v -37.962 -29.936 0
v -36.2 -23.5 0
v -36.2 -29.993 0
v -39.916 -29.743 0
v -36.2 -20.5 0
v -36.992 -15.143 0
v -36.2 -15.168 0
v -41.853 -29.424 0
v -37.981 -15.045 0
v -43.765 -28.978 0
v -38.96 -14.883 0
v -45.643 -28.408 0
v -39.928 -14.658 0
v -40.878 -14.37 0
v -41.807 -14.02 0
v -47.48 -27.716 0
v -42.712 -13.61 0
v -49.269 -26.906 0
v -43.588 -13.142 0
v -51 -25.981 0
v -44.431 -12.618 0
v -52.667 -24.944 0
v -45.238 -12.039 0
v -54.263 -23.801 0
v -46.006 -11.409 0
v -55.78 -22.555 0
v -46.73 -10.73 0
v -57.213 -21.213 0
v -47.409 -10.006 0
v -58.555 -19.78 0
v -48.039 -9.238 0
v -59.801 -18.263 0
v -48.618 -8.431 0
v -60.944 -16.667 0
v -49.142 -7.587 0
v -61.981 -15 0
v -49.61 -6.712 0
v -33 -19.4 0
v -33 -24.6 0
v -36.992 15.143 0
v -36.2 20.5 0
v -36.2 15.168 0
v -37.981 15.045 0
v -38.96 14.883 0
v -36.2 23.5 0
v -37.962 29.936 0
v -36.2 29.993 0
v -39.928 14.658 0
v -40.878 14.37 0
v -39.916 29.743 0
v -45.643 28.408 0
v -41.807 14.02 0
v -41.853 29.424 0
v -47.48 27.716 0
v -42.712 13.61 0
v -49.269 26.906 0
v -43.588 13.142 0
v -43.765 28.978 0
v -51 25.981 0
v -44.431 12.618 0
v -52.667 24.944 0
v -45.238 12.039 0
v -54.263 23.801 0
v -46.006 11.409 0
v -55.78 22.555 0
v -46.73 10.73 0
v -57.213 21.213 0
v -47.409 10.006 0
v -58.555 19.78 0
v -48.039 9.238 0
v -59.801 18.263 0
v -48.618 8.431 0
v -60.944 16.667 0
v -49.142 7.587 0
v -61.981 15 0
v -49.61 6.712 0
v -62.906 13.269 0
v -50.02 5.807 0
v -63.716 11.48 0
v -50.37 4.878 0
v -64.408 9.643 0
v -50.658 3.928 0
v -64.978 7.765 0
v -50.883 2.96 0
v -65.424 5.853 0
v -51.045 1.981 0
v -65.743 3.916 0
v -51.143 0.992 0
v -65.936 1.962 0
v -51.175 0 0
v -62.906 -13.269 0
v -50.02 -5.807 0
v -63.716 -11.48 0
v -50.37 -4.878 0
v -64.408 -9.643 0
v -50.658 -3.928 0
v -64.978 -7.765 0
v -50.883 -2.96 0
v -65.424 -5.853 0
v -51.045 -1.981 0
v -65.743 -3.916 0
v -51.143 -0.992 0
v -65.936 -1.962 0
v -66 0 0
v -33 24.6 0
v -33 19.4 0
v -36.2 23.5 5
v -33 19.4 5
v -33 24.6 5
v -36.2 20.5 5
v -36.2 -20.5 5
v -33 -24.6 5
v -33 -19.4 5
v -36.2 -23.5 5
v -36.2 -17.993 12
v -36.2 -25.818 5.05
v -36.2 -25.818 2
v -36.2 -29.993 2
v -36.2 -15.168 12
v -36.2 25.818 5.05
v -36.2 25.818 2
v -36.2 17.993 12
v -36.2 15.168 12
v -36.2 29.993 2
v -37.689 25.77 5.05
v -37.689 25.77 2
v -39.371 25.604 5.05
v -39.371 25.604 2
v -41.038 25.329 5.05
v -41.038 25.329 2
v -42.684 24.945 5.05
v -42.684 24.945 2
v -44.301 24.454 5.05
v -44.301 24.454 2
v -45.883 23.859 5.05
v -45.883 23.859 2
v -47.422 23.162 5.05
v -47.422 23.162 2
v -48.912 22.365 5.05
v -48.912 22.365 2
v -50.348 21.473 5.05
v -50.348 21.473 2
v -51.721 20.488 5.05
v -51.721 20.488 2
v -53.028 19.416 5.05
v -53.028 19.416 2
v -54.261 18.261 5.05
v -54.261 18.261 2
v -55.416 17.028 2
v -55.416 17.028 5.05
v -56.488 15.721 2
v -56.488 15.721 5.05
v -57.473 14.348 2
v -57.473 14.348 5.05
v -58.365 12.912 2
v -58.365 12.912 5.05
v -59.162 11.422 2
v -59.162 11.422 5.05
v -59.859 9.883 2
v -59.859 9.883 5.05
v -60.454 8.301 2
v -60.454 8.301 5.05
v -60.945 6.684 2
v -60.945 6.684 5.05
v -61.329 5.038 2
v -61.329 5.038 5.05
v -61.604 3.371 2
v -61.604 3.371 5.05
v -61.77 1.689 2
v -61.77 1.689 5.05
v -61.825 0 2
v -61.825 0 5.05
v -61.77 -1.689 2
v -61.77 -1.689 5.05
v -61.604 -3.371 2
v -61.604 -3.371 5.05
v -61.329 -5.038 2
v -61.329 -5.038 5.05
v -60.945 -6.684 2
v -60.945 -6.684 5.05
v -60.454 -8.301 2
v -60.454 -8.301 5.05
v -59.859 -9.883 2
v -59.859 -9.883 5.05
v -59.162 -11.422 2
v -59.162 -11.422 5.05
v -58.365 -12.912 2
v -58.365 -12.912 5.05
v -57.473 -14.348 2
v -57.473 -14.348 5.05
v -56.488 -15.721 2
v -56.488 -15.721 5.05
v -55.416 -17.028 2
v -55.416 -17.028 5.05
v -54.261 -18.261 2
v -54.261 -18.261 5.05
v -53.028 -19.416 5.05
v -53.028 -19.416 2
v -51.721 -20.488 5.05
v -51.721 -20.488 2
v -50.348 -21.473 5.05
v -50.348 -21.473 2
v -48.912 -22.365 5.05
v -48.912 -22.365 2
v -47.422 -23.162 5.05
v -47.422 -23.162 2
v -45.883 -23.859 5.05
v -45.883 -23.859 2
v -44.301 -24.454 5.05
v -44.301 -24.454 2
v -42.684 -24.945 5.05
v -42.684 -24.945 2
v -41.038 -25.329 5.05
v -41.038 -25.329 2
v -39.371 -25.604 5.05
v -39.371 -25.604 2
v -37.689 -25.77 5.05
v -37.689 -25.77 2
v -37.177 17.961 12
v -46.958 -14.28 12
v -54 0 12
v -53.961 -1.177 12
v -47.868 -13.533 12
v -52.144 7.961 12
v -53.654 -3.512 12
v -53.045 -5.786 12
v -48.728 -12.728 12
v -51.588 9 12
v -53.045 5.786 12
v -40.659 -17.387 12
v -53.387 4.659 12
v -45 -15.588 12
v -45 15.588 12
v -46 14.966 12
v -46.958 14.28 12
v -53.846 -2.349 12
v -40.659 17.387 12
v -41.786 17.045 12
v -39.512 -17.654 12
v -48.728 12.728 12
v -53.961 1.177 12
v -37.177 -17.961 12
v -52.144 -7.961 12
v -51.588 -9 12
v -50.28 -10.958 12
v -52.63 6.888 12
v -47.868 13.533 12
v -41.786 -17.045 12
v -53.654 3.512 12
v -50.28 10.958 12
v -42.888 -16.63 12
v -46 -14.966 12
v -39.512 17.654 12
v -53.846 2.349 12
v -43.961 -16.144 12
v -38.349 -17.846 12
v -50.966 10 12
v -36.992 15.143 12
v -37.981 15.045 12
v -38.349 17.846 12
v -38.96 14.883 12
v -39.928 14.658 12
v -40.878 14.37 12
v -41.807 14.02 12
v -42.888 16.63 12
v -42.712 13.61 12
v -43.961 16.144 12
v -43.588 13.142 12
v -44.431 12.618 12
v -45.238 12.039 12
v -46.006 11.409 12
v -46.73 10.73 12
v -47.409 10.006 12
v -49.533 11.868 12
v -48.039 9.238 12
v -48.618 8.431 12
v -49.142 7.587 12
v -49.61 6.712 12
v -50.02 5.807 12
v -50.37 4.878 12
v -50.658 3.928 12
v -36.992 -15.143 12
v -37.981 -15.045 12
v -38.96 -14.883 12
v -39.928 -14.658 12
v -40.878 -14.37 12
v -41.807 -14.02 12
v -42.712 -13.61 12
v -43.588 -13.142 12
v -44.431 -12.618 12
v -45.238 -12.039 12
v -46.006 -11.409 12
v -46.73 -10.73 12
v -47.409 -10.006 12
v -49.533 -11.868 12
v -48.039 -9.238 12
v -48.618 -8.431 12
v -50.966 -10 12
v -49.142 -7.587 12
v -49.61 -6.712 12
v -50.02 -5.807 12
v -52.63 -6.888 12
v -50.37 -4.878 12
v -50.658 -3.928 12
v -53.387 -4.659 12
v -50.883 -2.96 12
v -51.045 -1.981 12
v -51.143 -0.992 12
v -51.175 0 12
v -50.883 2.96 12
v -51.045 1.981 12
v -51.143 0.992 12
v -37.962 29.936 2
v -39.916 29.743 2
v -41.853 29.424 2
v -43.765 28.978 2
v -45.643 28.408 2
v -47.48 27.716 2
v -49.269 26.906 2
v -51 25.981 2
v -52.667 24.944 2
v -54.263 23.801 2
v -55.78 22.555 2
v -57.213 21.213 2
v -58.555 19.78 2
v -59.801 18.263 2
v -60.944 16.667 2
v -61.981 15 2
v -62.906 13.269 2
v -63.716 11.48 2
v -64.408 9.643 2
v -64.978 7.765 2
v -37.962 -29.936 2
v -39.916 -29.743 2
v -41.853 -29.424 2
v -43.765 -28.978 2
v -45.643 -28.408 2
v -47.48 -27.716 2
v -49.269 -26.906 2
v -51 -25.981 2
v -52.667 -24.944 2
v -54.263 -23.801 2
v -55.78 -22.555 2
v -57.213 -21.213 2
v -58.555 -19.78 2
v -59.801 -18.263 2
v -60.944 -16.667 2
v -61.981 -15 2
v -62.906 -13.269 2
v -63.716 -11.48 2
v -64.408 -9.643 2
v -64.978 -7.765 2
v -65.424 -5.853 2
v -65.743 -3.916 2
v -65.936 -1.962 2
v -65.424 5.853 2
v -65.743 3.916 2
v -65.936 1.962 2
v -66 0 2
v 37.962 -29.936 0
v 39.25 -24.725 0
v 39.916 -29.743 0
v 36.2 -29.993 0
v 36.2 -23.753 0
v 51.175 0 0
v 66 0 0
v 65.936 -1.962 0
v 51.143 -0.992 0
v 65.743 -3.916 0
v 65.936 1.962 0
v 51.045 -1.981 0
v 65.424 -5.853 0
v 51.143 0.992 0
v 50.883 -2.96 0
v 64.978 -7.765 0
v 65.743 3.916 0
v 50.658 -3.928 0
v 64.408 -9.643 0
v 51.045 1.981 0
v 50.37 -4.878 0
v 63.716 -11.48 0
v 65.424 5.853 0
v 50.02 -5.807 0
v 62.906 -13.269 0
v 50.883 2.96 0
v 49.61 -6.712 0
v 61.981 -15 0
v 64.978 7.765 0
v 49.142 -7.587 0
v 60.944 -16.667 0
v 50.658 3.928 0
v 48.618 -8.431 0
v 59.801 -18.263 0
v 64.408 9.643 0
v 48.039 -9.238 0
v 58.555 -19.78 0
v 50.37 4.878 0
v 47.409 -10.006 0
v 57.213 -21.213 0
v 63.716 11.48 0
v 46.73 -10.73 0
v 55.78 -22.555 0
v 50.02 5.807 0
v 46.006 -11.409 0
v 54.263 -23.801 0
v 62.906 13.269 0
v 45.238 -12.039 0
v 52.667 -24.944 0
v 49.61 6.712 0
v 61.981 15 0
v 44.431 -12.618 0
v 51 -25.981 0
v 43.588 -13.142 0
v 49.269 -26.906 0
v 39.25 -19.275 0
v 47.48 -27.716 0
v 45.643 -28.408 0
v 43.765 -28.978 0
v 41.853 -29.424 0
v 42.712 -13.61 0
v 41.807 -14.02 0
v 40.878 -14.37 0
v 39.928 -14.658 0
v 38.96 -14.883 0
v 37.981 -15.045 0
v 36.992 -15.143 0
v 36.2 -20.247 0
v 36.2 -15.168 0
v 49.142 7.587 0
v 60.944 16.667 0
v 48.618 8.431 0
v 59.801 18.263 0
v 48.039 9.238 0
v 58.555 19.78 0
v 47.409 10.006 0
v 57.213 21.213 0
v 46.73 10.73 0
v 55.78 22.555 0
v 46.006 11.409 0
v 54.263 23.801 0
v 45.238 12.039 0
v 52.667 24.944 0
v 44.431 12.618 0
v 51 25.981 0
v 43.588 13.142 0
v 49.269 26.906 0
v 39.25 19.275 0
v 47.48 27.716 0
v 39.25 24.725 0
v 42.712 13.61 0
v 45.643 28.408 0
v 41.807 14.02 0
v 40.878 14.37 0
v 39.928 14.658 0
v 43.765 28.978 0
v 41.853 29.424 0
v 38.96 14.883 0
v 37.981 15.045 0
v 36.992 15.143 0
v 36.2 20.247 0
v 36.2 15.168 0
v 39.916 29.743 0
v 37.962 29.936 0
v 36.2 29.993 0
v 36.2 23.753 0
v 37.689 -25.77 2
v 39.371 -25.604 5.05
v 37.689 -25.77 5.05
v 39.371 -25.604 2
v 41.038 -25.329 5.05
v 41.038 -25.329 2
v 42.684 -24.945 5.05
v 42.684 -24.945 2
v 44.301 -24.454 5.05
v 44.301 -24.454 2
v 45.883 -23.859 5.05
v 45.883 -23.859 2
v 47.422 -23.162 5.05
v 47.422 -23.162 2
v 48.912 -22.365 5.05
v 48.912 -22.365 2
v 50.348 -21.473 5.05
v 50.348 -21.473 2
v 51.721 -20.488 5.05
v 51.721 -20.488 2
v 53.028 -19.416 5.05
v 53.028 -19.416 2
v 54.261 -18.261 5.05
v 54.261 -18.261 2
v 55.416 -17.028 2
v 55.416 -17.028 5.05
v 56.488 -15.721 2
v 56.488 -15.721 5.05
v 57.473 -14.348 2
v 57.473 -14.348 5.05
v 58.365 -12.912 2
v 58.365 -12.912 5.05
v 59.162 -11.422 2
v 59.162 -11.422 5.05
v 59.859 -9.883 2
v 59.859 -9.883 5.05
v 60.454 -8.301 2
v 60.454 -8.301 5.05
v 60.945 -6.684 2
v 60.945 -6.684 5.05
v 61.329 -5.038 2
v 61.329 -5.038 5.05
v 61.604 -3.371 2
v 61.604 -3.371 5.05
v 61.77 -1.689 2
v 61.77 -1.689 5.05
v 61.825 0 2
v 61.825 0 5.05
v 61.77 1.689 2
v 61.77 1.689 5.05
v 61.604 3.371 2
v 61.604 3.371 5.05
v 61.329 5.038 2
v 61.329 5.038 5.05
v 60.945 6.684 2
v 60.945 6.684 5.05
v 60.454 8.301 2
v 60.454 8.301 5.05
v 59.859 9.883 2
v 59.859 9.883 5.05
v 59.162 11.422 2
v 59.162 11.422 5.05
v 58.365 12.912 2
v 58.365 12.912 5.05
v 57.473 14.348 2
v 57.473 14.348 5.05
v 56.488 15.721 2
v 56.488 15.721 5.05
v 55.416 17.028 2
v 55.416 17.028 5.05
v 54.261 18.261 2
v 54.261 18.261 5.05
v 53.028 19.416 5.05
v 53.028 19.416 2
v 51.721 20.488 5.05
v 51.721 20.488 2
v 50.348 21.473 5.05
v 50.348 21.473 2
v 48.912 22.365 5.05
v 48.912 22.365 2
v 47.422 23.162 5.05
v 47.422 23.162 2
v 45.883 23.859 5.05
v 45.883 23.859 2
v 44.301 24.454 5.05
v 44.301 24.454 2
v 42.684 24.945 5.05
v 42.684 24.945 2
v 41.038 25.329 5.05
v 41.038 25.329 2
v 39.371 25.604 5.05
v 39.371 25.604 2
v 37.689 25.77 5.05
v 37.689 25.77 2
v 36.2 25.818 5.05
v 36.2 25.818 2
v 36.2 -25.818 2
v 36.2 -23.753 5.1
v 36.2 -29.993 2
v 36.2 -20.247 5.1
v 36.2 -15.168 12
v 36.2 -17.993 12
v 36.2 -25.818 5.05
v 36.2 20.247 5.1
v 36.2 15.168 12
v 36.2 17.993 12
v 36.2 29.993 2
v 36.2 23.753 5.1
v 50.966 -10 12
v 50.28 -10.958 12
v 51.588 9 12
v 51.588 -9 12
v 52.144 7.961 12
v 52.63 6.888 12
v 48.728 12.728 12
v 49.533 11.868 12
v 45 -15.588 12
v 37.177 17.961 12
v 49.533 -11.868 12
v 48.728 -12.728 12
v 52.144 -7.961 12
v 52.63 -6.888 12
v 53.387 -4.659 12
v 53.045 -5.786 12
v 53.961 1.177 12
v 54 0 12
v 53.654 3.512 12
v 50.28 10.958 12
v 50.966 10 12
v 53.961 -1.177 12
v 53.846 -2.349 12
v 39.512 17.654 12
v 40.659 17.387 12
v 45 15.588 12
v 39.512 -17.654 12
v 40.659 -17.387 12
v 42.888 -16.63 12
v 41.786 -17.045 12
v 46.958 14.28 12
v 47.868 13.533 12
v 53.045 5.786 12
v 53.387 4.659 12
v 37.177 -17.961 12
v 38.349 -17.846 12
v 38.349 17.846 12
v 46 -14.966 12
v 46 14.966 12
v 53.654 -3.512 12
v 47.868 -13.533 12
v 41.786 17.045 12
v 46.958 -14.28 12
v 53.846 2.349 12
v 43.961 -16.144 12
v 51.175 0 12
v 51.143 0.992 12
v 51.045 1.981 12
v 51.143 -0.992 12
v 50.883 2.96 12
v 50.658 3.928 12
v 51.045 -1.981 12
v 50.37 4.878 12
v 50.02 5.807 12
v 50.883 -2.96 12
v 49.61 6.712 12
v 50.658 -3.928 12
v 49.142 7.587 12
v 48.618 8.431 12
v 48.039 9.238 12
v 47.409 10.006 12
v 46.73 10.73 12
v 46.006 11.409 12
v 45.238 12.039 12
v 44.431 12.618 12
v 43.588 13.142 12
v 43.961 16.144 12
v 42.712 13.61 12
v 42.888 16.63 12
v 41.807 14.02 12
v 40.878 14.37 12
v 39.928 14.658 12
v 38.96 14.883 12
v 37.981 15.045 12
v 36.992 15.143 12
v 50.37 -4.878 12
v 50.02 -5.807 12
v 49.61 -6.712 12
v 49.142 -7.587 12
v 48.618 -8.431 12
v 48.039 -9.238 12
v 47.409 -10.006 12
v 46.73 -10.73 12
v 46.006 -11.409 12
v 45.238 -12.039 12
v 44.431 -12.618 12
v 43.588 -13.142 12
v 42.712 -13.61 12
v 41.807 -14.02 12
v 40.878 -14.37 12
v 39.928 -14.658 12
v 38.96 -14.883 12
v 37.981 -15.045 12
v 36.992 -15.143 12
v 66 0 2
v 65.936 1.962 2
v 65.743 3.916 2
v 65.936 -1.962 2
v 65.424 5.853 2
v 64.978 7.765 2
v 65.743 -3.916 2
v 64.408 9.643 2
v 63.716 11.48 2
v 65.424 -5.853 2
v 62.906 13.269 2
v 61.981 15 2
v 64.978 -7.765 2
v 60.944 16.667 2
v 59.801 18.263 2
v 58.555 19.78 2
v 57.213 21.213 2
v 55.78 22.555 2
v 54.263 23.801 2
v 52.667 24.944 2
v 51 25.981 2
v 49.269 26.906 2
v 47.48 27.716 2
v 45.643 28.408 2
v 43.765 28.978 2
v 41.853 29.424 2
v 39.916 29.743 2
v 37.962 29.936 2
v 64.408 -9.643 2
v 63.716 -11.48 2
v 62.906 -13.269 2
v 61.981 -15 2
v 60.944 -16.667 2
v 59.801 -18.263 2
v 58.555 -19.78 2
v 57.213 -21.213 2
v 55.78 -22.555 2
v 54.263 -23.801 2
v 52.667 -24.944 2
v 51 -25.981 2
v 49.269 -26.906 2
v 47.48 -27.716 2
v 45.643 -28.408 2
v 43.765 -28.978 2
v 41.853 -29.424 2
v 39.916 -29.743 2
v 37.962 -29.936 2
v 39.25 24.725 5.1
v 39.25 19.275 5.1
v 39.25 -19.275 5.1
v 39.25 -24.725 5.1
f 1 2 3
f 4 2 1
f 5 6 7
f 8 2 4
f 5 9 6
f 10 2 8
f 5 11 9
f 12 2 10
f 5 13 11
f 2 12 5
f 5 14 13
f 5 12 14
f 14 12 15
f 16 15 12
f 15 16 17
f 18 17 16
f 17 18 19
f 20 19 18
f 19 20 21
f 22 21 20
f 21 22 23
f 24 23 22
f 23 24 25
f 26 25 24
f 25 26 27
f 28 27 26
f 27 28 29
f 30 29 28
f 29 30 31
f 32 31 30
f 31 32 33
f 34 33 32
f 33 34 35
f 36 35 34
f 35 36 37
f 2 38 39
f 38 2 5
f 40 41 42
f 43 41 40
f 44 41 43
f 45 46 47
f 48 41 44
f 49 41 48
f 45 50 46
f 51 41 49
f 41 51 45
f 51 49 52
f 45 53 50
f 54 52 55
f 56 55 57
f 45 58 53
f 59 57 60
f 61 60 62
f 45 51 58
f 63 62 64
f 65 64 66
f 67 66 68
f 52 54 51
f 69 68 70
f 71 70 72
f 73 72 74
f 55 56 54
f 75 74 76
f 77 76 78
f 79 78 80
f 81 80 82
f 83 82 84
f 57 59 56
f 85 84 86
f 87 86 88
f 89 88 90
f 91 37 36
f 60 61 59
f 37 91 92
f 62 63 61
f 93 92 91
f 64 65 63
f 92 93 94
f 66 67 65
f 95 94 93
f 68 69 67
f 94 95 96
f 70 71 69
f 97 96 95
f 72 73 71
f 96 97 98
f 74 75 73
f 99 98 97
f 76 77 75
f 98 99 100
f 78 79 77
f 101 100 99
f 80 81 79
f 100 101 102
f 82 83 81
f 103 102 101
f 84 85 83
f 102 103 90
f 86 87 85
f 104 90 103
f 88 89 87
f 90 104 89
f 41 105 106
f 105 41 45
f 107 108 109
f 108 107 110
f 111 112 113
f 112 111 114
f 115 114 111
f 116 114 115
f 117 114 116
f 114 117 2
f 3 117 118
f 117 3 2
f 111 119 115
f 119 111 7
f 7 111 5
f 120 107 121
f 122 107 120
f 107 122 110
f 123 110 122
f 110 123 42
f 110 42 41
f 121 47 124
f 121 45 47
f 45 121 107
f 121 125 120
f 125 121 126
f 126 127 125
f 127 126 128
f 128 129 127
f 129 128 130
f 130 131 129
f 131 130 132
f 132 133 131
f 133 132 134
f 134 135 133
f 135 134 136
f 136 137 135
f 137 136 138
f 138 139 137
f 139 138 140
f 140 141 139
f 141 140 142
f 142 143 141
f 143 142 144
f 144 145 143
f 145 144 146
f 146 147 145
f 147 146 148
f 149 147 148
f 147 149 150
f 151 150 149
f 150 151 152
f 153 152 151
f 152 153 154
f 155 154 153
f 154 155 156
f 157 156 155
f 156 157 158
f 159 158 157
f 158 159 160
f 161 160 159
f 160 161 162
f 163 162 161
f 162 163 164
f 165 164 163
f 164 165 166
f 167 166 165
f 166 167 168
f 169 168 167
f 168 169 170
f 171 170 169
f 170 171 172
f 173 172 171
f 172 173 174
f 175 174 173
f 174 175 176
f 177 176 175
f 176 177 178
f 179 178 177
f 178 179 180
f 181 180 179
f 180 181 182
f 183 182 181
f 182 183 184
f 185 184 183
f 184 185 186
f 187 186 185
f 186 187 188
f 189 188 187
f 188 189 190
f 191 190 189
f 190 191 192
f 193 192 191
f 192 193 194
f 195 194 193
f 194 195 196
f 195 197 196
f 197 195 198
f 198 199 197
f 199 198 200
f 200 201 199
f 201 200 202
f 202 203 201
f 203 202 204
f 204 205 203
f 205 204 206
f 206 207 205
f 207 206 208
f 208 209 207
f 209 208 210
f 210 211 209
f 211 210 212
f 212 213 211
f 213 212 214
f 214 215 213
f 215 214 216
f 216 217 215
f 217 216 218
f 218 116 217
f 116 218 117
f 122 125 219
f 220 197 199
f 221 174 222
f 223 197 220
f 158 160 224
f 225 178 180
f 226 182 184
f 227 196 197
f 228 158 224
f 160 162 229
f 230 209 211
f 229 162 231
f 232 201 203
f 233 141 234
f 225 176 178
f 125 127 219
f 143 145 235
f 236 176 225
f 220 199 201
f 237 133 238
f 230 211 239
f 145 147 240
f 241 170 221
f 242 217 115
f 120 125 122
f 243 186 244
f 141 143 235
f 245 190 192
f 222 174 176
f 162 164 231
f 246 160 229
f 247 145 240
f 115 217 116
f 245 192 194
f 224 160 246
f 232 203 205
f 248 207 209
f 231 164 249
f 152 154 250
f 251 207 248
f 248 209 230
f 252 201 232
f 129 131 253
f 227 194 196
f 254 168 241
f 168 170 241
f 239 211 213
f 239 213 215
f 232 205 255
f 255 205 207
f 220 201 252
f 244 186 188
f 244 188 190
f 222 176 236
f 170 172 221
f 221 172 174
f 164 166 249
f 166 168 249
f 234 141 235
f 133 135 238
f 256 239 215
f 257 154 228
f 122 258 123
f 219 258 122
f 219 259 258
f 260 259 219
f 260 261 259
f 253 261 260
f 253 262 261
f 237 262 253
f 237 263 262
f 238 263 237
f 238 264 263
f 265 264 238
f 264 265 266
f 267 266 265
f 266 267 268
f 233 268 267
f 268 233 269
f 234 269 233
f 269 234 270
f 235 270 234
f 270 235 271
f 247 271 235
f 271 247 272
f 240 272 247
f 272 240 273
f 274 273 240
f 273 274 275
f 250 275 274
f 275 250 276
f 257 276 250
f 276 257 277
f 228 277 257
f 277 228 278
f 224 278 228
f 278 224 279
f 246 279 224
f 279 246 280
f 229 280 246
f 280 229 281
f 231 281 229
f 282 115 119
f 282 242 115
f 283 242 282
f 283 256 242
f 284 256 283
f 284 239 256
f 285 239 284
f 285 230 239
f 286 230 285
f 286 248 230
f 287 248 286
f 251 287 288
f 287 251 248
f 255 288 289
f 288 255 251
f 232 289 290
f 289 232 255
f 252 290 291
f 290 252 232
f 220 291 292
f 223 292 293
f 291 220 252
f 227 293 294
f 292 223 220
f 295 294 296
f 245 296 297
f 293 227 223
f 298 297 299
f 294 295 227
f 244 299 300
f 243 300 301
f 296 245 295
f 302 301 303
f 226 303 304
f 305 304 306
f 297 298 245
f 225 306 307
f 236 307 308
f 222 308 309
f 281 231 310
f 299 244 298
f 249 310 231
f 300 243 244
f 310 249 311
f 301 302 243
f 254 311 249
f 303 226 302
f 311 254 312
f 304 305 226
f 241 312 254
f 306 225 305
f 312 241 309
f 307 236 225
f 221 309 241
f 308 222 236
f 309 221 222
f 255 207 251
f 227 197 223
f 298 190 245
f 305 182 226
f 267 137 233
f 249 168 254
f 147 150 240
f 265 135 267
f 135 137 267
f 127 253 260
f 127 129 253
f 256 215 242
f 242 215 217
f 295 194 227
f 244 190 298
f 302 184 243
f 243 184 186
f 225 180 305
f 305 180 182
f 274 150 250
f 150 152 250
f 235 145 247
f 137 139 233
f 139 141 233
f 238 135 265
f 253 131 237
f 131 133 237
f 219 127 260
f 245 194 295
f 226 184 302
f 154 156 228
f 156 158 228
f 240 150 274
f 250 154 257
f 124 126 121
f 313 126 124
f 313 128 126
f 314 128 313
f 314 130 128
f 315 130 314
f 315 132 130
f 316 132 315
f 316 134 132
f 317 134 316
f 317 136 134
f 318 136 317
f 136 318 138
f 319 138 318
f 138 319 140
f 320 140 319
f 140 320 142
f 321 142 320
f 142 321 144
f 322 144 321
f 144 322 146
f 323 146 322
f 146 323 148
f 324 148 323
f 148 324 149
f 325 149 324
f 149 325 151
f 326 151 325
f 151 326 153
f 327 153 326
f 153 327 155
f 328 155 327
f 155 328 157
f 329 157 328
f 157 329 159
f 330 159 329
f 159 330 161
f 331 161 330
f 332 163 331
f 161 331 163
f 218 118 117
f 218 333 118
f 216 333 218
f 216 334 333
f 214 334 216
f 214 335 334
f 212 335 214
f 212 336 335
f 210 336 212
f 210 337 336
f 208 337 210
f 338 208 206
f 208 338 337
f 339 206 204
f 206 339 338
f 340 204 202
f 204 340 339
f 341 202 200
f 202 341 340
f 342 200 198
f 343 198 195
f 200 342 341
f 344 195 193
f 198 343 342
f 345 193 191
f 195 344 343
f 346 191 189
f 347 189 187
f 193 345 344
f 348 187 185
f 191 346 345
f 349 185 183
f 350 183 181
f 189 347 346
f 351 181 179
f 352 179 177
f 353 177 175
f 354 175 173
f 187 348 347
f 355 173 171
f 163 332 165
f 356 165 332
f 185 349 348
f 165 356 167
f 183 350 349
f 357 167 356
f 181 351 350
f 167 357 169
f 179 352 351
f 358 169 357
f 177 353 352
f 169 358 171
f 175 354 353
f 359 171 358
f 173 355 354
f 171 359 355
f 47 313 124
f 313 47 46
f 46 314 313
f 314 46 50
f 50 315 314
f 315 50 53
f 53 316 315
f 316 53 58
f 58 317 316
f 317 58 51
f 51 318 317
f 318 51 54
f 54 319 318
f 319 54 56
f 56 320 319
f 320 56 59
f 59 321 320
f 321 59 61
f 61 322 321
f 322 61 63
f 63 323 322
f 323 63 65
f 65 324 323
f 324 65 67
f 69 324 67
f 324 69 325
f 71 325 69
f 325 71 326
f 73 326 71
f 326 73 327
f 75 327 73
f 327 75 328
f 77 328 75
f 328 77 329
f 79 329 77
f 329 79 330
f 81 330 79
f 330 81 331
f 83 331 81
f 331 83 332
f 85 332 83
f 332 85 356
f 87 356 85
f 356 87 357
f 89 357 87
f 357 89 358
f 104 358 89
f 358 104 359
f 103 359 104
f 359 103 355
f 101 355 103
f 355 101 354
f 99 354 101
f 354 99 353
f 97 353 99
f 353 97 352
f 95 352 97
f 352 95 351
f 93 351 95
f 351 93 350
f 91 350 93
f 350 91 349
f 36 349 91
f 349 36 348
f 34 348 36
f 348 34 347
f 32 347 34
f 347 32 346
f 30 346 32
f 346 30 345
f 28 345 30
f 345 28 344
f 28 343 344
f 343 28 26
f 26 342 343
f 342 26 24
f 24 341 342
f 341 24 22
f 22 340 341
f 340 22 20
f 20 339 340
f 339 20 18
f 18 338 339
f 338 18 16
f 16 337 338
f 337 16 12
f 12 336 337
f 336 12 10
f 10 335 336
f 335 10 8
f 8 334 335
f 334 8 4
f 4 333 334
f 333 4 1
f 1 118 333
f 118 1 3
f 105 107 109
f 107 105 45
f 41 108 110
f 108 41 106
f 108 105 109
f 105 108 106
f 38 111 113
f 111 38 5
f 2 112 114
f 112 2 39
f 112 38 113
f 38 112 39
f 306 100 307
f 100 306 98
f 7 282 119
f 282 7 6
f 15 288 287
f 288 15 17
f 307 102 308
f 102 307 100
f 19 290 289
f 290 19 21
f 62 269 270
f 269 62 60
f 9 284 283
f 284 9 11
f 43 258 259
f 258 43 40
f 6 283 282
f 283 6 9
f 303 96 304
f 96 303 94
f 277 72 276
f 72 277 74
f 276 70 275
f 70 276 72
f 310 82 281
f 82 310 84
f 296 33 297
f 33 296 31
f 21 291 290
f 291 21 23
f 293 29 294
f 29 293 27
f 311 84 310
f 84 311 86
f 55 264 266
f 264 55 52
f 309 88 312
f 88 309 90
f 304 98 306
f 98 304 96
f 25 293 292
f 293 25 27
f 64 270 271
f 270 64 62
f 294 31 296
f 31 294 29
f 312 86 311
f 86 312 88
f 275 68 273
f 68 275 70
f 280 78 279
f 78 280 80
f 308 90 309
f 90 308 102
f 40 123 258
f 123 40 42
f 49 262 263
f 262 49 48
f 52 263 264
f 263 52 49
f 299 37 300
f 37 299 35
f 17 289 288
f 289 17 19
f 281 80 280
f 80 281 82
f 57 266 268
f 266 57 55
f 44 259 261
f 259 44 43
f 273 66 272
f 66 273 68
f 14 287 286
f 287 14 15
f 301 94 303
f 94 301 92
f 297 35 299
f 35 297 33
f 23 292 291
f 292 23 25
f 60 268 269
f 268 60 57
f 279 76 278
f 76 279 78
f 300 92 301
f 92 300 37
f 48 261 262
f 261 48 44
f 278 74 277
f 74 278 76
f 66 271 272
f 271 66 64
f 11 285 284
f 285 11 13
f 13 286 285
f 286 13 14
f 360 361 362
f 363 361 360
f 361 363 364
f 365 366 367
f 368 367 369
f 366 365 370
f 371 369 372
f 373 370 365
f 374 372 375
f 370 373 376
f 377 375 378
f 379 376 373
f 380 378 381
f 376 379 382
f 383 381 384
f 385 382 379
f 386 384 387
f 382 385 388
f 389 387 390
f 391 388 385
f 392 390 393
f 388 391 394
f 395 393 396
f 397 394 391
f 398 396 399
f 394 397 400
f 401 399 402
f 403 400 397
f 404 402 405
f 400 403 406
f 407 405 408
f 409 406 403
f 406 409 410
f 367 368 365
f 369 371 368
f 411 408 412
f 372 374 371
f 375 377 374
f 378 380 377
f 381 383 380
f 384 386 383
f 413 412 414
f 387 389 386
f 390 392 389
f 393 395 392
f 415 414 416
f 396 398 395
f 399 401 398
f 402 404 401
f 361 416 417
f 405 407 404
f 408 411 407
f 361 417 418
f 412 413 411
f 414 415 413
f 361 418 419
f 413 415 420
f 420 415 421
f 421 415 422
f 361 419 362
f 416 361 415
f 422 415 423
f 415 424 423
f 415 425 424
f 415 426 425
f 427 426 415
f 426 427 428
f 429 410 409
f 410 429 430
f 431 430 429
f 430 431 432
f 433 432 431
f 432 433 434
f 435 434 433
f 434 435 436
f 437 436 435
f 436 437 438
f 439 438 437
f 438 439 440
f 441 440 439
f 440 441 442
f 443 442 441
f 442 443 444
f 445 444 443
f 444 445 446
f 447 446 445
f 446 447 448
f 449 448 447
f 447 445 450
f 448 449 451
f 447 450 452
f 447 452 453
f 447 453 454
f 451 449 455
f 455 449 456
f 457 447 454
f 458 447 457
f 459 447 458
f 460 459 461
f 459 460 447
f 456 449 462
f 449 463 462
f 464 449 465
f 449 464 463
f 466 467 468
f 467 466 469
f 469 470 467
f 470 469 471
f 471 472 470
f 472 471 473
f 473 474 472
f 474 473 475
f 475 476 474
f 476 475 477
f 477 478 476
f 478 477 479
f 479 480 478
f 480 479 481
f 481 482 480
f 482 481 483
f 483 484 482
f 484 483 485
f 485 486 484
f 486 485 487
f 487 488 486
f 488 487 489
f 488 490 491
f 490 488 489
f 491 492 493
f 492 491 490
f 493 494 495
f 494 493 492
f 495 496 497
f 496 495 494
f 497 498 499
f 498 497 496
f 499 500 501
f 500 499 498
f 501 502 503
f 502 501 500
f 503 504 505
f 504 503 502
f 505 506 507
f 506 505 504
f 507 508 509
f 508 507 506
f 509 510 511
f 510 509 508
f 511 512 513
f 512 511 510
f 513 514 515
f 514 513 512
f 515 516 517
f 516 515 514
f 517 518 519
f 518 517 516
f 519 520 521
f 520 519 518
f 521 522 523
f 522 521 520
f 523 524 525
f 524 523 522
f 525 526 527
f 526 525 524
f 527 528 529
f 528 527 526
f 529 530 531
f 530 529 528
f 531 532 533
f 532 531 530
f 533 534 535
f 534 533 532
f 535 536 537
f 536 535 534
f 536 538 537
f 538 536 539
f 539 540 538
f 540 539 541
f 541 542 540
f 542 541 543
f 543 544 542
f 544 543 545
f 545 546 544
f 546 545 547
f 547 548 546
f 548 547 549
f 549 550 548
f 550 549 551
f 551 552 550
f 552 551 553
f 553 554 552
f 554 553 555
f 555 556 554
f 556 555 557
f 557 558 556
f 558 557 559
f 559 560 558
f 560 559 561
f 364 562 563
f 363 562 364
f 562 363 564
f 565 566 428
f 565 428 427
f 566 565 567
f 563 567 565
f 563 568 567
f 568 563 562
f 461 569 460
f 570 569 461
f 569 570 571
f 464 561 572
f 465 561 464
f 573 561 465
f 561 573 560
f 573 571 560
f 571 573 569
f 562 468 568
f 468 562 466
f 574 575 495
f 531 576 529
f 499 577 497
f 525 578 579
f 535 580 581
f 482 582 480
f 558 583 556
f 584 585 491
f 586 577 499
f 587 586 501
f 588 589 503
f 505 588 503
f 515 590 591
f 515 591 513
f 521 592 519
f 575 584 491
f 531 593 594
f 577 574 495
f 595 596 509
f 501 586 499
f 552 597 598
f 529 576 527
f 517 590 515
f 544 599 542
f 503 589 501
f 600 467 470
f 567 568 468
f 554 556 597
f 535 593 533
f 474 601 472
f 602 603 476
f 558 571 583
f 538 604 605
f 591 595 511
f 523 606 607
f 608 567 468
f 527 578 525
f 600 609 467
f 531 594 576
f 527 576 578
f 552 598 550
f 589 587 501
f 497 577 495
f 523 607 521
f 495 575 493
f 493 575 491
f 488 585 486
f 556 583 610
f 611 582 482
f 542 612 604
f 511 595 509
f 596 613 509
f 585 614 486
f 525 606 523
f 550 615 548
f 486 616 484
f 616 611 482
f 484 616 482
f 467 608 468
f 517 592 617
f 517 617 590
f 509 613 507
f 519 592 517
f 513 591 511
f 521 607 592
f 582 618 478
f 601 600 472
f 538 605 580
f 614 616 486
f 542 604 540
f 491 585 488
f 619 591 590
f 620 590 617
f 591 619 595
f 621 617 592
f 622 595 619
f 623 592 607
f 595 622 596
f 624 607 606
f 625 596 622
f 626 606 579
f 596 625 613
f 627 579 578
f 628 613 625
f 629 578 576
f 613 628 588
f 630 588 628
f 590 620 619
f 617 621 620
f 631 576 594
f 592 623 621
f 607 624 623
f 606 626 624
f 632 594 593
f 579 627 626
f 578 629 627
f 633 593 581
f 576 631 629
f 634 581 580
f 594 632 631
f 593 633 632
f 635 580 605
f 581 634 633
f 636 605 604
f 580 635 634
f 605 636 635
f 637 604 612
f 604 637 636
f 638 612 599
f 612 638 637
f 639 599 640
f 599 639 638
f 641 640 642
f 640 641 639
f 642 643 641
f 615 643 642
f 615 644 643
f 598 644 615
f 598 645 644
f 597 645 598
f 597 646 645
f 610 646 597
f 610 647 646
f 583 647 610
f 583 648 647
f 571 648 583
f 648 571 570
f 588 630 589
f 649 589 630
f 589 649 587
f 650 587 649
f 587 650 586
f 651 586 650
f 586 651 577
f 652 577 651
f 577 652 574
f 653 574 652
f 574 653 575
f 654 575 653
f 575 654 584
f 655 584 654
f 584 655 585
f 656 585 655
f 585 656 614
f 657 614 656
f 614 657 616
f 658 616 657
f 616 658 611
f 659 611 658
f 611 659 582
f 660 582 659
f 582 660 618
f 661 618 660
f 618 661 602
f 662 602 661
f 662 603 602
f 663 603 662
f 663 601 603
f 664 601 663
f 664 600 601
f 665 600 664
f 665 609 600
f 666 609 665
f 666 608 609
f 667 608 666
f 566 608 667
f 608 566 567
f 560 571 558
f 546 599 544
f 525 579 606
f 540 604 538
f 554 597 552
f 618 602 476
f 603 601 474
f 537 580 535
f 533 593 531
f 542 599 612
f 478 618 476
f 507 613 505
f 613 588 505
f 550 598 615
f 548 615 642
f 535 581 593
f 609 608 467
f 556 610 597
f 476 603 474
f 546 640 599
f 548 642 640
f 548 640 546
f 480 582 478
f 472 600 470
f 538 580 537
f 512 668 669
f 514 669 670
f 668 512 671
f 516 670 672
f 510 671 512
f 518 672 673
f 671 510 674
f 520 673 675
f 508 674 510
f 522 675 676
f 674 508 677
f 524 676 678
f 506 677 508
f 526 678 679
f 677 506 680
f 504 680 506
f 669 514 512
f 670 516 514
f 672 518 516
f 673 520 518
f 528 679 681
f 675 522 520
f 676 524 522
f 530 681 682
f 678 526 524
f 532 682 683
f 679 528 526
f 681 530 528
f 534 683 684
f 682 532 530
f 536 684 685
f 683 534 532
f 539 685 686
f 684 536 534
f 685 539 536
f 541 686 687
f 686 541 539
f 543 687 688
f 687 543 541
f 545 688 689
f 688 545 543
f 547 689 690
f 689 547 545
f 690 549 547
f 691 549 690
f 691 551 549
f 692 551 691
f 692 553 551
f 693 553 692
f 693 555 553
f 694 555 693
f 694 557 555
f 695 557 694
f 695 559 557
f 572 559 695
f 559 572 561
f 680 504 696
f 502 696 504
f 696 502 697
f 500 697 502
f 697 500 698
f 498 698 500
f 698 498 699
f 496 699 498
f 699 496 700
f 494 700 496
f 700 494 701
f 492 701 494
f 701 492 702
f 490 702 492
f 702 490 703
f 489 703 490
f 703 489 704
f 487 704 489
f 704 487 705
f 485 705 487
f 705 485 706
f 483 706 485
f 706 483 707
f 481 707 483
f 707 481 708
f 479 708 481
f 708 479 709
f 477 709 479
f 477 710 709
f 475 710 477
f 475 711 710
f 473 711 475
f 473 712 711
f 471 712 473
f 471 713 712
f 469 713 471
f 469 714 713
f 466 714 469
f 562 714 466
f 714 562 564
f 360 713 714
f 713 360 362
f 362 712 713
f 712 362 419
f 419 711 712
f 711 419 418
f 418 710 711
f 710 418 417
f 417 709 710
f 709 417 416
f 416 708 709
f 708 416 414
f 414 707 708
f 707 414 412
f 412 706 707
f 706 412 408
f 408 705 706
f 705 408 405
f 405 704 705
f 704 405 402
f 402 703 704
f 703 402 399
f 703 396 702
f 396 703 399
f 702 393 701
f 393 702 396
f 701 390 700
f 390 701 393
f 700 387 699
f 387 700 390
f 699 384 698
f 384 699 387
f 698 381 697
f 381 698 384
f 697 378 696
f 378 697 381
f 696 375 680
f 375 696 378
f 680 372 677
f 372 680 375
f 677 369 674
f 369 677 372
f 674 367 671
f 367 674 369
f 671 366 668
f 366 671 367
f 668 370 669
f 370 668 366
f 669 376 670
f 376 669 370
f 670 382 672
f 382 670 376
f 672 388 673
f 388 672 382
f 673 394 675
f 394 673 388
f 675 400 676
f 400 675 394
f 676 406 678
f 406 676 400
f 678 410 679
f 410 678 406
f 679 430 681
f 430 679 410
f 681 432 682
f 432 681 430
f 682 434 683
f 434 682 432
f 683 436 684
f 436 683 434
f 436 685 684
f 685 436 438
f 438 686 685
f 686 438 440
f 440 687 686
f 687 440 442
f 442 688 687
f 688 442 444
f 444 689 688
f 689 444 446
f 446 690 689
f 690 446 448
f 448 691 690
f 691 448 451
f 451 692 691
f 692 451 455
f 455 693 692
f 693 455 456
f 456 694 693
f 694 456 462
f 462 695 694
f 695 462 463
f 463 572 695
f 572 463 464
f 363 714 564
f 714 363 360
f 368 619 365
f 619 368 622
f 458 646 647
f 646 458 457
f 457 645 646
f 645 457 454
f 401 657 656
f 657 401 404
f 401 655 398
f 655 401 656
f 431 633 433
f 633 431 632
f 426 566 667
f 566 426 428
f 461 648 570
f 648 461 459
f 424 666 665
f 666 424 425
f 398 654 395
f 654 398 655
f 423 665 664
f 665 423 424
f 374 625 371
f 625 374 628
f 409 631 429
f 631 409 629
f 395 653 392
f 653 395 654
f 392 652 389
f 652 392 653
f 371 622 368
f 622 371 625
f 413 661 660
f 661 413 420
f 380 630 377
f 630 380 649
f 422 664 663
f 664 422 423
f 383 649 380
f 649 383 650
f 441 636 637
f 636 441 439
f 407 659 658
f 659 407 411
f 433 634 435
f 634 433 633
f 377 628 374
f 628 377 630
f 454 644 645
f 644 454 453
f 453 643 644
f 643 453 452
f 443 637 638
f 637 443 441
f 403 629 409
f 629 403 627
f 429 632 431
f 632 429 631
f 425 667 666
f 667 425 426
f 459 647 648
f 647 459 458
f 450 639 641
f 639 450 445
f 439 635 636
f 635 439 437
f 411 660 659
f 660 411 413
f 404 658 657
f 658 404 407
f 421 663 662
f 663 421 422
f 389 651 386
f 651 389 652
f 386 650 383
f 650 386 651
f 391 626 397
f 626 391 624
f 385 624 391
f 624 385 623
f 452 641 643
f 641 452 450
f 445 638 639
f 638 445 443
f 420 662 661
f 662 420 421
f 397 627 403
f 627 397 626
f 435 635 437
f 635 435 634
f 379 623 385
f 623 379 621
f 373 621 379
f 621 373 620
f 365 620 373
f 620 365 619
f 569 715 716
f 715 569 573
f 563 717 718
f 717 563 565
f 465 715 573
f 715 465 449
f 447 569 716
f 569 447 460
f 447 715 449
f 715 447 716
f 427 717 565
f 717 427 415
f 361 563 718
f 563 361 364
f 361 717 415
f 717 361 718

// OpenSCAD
// Parametric two-piece filament spool adapter V3.
// Dimensions are in millimeters.
//
// V3 default values match the existing CR-6 STL intent:
// - 30 mm printer shaft
// - 52 mm spool bore
// - 60 mm keeper/flange supported against the spool side
//
// Render both printable halves side-by-side, then put the halves together
// around the shaft to adapt the shaft diameter up to the spool bore.

$fn = 96;

shaft_diameter = 30;
spool_bore_diameter = 52;
keeper_outer_diameter = 60;

adapter_width = 12;        // Total axial width of each half.
keeper_width = 2;          // Axial thickness of the side keeper/flange.
spool_seat_width = 5;      // Straight section that seats in the spool bore.
taper_end_diameter = 36;   // Outside diameter at the shaft-side end of taper.
clearance = 0.35;          // Added to the shaft bore and removed from the spool fit.
split_gap = 0.4;           // Clearance between the two assembled half faces.
print_gap = 12;            // Gap between the two halves in the rendered layout.

// Small flat pads at the split line help the halves sit cleanly together and
// make the geometry more robust when printed.
split_flat_width = 1.2;

// V3 dovetails: the left half gets two male keys and the right half gets
// matching sockets. They run axially through the straight spool-seat area so
// the halves slide together from the side and resist pulling apart.
dovetail_length = 3.2;     // How far each key reaches across the split.
dovetail_neck = 3.0;       // Narrow side of the dovetail at the split face.
dovetail_head = 5.2;       // Wider locking side of the dovetail.
dovetail_clearance = 0.25; // Extra space in the socket for printable fit.
dovetail_y_offset = 22;    // Distance from center to upper/lower dovetails.

module half_annulus_2d(outer_diameter, inner_diameter, side = 1) {
    radius = outer_diameter / 2;

    difference() {
        intersection() {
            circle(d = outer_diameter);

            // Keep only one side of the circular adapter.  The extra overlap
            // avoids coincident edges at the split line.
            translate([
                side > 0 ? split_gap / 2 : -radius - 1,
                -radius - 1
            ])
                square([radius + 1 - split_gap / 2, outer_diameter + 2]);
        }

        circle(d = inner_diameter);

        // Trim a narrow strip from the split face so the two halves do not bind
        // when they are clamped around the shaft.
        translate([
            side > 0 ? -split_flat_width : -split_gap / 2,
            -radius - 1
        ])
            square([split_flat_width + split_gap / 2, outer_diameter + 2]);
    }
}

module tapered_half_annulus(
    start_outer_diameter,
    end_outer_diameter,
    inner_diameter,
    height,
    side = 1
) {
    // Hull two very thin half-annulus slices to create a conical taper.  The
    // bore stays constant for the shaft while the outside shrinks from the
    // spool seat toward the smaller shaft-side end.
    slice_height = 0.05;

    if (height > 0) {
        hull() {
            linear_extrude(height = slice_height)
                half_annulus_2d(start_outer_diameter, inner_diameter, side);

            translate([0, 0, height - slice_height])
                linear_extrude(height = slice_height)
                    half_annulus_2d(end_outer_diameter, inner_diameter, side);
        }
    }
}

module dovetail_2d(extra = 0) {
    // Trapezoid points from the split face toward the mating half.
    polygon([
        [0, -(dovetail_neck + extra) / 2],
        [dovetail_length + extra, -(dovetail_head + extra) / 2],
        [dovetail_length + extra, (dovetail_head + extra) / 2],
        [0, (dovetail_neck + extra) / 2]
    ]);
}

module dovetail_pair_2d(extra = 0) {
    for (y = [-dovetail_y_offset, dovetail_y_offset])
        translate([-split_gap / 2, y])
            dovetail_2d(extra);
}

module dovetail_keys(height) {
    linear_extrude(height = height)
        dovetail_pair_2d();
}

module dovetail_sockets(height) {
    translate([0, 0, -0.1])
        linear_extrude(height = height + 0.2)
            dovetail_pair_2d(dovetail_clearance);
}

module adapter_half(side = 1) {
    shaft_bore = shaft_diameter + clearance;
    spool_fit = spool_bore_diameter - clearance;
    taper_end = max(taper_end_diameter, shaft_bore + 2);
    seat_width = min(spool_seat_width, adapter_width);
    taper_width = adapter_width - seat_width;

    difference() {
        union() {
            // Straight spool seat at the keeper side.
            linear_extrude(height = seat_width)
                half_annulus_2d(spool_fit, shaft_bore, side);

            // Taper from the spool seat back toward the smaller shaft-side end.
            translate([0, 0, seat_width])
                tapered_half_annulus(
                    spool_fit,
                    taper_end,
                    shaft_bore,
                    taper_width,
                    side
                );

            // Larger side keeper/flange.  This is intentionally only on one side
            // so it bears on the side of the spool instead of widening the whole
            // adapter.
            linear_extrude(height = keeper_width)
                half_annulus_2d(keeper_outer_diameter, shaft_bore, side);

            // Male dovetails live on one half only; the mating half has sockets.
            if (side < 0)
                dovetail_keys(seat_width);
        }

        // The hull used for the taper can bridge across the center bore.
        // Subtract the shaft bore through the finished half as a final step so
        // the 30 mm shaft hole always passes through the entire adapter width.
        translate([0, 0, -0.1])
            linear_extrude(height = adapter_width + 0.2)
                circle(d = shaft_bore);

        if (side > 0)
            dovetail_sockets(seat_width);
    }
}

module printable_pair() {
    part_offset = keeper_outer_diameter / 2 + print_gap / 2;

    translate([-part_offset, 0, 0])
        adapter_half(side = -1);

    translate([part_offset, 0, 0])
        adapter_half(side = 1);
}

printable_pair();
